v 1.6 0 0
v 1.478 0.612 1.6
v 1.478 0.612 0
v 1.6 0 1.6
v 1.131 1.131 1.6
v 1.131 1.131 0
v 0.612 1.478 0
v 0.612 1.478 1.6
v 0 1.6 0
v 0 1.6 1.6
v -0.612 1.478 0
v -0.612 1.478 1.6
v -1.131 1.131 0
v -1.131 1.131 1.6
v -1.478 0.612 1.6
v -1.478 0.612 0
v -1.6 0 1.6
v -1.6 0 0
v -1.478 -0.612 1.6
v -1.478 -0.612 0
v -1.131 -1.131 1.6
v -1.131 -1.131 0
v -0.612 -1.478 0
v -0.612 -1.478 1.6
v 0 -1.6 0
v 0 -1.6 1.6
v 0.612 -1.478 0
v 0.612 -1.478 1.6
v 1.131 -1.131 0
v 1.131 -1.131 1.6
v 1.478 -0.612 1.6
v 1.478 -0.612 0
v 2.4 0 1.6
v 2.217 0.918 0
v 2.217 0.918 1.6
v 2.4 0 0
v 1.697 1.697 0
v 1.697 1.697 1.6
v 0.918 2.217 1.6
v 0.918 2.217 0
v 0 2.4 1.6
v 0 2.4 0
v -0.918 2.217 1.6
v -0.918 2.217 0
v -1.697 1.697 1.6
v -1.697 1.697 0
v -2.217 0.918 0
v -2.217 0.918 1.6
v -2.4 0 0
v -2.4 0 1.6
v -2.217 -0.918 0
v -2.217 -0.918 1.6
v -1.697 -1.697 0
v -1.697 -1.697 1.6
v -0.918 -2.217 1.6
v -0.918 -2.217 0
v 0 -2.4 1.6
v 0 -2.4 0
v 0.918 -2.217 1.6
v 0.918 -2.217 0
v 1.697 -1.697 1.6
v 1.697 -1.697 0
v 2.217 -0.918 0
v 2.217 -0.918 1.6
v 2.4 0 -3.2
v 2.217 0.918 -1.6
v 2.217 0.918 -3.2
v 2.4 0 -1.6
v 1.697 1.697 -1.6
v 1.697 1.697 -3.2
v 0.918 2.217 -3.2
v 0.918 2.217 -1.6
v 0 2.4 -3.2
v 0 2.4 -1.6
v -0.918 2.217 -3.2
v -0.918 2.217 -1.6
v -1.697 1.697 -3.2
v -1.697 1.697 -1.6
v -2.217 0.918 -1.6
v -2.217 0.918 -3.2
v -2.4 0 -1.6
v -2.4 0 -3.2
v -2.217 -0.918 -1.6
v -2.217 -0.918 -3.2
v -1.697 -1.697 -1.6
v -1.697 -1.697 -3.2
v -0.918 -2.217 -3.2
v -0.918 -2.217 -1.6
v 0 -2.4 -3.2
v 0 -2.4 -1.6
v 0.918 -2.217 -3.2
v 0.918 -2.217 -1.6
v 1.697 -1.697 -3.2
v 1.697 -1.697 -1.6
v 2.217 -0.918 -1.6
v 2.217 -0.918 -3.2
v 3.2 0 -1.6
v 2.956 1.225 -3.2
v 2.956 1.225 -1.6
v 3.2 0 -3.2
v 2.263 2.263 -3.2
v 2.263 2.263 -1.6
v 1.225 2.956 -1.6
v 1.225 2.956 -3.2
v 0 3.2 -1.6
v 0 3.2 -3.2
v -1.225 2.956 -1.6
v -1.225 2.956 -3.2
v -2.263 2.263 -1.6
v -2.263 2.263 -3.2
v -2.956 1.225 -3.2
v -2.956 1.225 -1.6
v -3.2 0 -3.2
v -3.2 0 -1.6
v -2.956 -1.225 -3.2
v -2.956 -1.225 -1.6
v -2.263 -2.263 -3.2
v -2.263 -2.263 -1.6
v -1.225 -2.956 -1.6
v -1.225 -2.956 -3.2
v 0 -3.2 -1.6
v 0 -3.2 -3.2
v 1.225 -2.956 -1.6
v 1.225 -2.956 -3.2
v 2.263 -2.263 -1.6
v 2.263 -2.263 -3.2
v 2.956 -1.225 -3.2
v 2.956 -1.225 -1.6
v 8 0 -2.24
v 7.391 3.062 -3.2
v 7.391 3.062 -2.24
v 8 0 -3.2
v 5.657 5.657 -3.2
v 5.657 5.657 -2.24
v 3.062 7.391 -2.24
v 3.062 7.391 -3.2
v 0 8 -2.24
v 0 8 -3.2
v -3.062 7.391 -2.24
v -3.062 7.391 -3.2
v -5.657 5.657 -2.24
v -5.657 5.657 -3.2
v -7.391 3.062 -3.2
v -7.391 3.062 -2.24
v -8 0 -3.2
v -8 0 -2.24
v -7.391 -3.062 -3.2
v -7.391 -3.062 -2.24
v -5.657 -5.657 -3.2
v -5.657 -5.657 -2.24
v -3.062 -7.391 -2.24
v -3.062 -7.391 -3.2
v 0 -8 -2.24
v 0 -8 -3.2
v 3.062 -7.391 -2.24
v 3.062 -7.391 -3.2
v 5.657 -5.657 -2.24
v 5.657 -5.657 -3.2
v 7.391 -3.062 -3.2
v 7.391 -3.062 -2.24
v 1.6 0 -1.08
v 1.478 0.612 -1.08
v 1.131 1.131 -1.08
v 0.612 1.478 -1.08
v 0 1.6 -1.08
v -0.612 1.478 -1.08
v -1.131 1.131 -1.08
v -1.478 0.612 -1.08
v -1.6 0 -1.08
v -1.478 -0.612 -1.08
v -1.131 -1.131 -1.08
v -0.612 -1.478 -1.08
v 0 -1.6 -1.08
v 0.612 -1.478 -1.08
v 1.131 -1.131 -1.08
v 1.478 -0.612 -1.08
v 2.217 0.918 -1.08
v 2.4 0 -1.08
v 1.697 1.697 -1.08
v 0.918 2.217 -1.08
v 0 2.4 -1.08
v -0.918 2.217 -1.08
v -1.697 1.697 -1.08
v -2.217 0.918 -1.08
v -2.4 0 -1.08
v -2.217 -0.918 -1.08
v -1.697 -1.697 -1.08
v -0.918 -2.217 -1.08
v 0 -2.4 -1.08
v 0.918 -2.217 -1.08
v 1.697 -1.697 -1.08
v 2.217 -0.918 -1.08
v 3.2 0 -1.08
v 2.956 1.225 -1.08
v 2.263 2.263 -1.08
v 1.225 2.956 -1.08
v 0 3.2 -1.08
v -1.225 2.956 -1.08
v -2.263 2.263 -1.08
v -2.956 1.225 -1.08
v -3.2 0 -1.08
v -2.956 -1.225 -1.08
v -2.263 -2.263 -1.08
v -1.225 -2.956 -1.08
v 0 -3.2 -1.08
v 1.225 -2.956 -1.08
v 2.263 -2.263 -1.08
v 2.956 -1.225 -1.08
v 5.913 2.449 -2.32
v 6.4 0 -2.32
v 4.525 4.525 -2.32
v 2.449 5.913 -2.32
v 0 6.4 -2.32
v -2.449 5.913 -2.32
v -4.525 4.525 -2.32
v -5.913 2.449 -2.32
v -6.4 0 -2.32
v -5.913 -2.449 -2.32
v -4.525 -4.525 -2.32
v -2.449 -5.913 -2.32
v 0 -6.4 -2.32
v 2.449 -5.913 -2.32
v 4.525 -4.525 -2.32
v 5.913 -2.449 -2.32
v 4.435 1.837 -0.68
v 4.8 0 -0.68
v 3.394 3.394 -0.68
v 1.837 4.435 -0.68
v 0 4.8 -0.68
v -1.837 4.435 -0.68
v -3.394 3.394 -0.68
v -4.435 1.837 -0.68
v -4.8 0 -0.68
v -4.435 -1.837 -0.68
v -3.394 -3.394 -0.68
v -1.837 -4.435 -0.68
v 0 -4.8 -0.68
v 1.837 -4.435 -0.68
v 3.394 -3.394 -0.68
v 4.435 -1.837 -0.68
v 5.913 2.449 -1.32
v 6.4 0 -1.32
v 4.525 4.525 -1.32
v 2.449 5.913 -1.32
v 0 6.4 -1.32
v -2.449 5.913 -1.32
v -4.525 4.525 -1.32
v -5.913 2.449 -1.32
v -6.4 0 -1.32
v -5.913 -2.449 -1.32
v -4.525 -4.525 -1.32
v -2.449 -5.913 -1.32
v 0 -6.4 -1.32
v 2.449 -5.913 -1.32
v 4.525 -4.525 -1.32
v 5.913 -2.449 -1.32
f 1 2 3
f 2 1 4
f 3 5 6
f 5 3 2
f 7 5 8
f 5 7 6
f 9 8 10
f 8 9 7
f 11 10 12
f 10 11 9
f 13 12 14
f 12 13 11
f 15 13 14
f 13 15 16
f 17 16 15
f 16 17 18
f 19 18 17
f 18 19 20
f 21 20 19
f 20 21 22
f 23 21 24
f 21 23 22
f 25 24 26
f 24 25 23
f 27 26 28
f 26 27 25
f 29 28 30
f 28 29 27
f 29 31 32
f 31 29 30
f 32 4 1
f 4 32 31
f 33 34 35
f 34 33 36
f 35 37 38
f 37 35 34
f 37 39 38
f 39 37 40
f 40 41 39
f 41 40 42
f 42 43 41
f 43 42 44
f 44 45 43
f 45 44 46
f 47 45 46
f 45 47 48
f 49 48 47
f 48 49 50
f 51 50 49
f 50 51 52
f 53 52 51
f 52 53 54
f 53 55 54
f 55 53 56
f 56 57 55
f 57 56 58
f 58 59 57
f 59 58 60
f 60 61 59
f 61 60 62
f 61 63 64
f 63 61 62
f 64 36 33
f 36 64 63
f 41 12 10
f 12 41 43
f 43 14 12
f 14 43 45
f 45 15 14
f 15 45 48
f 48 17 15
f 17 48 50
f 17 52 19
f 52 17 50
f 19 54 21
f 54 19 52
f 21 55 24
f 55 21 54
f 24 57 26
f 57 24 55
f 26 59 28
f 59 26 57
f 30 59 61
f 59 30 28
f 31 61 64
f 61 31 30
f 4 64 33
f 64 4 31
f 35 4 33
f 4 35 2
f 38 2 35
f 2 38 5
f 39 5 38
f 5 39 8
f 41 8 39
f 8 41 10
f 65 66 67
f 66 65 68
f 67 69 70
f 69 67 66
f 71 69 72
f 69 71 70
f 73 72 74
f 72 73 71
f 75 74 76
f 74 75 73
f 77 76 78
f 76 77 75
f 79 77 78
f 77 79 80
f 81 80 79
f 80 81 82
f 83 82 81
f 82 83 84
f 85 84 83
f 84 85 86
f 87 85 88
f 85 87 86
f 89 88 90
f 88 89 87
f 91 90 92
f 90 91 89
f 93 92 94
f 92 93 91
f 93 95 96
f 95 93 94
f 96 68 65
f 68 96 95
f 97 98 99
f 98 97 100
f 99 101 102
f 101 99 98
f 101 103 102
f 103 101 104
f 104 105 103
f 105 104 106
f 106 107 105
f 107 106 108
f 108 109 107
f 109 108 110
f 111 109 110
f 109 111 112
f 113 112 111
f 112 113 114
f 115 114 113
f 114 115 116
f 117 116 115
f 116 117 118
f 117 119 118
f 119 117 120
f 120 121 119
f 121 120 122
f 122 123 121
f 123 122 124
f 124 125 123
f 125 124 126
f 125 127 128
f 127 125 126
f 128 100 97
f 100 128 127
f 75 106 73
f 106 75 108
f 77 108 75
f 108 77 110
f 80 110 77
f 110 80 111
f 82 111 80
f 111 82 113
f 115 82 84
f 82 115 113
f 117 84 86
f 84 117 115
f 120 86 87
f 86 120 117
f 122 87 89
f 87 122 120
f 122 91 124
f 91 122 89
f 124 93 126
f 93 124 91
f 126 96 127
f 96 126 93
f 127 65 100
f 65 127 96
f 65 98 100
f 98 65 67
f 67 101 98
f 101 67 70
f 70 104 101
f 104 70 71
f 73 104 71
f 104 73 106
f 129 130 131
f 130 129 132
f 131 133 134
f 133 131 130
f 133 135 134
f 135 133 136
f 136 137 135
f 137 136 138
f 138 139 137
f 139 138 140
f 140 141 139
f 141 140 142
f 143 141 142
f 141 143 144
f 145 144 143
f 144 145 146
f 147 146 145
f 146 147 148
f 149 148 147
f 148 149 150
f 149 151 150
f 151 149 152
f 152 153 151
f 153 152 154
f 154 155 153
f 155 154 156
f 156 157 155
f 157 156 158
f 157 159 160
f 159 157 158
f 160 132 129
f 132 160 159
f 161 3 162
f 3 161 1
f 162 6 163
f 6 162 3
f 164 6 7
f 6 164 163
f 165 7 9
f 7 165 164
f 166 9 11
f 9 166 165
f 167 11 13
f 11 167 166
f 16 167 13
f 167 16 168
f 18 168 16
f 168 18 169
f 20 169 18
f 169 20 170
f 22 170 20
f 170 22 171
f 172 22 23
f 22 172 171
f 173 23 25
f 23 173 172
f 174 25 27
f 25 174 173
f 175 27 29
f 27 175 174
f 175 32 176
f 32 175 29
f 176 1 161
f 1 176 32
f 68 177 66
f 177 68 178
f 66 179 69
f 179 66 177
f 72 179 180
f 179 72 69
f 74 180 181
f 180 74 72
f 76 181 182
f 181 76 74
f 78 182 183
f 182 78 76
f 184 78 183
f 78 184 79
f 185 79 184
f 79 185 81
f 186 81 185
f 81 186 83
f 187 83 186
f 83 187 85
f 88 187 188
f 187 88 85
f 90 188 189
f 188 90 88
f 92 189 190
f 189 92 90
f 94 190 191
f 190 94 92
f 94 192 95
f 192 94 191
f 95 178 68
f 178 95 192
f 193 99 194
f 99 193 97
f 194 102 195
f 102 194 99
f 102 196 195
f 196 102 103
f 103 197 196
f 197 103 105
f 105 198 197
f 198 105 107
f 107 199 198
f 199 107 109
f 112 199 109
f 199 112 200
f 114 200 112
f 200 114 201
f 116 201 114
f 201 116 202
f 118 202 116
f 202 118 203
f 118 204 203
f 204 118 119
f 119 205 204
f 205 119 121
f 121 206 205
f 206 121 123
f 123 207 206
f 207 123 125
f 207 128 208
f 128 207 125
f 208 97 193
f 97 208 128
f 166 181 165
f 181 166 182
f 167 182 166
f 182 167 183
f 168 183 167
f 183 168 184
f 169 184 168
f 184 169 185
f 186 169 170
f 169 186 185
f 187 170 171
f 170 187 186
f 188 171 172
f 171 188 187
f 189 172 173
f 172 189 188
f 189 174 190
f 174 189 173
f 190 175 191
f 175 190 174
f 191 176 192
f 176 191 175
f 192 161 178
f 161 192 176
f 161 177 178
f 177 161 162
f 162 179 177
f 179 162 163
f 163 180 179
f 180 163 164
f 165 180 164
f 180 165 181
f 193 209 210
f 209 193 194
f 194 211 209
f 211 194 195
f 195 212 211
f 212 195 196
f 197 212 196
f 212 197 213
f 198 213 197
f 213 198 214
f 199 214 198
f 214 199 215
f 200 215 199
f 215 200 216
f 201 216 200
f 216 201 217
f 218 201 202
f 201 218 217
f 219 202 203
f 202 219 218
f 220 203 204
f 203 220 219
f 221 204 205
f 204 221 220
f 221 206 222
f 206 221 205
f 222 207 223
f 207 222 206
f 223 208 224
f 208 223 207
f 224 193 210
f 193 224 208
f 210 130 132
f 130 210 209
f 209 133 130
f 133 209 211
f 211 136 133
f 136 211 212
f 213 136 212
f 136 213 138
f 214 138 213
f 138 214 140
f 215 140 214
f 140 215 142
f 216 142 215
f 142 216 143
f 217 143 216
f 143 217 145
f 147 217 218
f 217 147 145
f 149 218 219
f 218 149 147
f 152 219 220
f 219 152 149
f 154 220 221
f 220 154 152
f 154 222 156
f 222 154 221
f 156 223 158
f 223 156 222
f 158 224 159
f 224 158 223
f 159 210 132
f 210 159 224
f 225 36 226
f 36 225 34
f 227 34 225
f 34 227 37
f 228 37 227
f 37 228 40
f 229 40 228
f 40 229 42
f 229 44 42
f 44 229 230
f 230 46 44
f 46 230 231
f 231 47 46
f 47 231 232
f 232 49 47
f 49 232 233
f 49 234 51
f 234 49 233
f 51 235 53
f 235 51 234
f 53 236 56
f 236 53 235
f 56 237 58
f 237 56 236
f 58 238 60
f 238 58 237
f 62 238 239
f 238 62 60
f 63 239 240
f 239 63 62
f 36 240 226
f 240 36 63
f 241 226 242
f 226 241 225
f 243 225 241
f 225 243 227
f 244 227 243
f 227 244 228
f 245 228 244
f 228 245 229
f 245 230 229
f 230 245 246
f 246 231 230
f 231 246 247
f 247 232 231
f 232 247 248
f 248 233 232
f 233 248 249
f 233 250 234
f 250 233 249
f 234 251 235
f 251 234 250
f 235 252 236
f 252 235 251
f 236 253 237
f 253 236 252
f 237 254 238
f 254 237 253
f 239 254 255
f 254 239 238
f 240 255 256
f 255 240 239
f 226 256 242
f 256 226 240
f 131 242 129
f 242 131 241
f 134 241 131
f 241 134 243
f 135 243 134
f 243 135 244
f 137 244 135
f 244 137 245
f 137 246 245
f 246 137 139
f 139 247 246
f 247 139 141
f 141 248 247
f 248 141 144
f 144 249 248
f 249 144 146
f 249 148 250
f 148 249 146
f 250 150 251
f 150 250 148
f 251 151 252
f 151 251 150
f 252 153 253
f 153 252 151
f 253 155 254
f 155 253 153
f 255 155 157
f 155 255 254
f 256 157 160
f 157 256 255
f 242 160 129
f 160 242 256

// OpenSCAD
use <../lib.scad>
use <4740.scad>
$fa=1; $fs=0.2;
function ldraw_lib__296(realsolid=false) = [
// 0 ~Moved to 4740
// 0 Name: 296.dat
// 0 Author: [PTadmin]
// 0 !LDRAW_ORG Part UPDATE 1998-06
// 0 !LICENSE Licensed under CC BY 4.0 : see CAreadme.txt
// 
// 0 BFC CERTIFY CCW
  [0,"BFC","CERTIFY"],
  [0,"BFC","CCW"],
// 
// 0 !HISTORY 1998-06-20 [PTadmin] Official Update 1998-06
// 0 !HISTORY 2007-05-23 [PTadmin] Header formatted for Contributor Agreement
// 0 !HISTORY 2008-07-01 [PTadmin] Official Update 2008-01
// 
// 
// 1 16 0 0 0 1 0 0 0 1 0 0 0 1 4740.dat
  [1,16,0,0,0,1,0,0,0,1,0,0,0,1, ldraw_lib__4740(realsolid)],
];
module ldraw_lib__296(step=0, col=false, unit=2/5, alt=false, line=0.2, solid=!$preview)
    makepoly(ldraw_lib__296(solid), step=step, col=col, unit=unit, alt=alt, line=line, solid=solid);
ldraw_lib__296(line=0.2);
